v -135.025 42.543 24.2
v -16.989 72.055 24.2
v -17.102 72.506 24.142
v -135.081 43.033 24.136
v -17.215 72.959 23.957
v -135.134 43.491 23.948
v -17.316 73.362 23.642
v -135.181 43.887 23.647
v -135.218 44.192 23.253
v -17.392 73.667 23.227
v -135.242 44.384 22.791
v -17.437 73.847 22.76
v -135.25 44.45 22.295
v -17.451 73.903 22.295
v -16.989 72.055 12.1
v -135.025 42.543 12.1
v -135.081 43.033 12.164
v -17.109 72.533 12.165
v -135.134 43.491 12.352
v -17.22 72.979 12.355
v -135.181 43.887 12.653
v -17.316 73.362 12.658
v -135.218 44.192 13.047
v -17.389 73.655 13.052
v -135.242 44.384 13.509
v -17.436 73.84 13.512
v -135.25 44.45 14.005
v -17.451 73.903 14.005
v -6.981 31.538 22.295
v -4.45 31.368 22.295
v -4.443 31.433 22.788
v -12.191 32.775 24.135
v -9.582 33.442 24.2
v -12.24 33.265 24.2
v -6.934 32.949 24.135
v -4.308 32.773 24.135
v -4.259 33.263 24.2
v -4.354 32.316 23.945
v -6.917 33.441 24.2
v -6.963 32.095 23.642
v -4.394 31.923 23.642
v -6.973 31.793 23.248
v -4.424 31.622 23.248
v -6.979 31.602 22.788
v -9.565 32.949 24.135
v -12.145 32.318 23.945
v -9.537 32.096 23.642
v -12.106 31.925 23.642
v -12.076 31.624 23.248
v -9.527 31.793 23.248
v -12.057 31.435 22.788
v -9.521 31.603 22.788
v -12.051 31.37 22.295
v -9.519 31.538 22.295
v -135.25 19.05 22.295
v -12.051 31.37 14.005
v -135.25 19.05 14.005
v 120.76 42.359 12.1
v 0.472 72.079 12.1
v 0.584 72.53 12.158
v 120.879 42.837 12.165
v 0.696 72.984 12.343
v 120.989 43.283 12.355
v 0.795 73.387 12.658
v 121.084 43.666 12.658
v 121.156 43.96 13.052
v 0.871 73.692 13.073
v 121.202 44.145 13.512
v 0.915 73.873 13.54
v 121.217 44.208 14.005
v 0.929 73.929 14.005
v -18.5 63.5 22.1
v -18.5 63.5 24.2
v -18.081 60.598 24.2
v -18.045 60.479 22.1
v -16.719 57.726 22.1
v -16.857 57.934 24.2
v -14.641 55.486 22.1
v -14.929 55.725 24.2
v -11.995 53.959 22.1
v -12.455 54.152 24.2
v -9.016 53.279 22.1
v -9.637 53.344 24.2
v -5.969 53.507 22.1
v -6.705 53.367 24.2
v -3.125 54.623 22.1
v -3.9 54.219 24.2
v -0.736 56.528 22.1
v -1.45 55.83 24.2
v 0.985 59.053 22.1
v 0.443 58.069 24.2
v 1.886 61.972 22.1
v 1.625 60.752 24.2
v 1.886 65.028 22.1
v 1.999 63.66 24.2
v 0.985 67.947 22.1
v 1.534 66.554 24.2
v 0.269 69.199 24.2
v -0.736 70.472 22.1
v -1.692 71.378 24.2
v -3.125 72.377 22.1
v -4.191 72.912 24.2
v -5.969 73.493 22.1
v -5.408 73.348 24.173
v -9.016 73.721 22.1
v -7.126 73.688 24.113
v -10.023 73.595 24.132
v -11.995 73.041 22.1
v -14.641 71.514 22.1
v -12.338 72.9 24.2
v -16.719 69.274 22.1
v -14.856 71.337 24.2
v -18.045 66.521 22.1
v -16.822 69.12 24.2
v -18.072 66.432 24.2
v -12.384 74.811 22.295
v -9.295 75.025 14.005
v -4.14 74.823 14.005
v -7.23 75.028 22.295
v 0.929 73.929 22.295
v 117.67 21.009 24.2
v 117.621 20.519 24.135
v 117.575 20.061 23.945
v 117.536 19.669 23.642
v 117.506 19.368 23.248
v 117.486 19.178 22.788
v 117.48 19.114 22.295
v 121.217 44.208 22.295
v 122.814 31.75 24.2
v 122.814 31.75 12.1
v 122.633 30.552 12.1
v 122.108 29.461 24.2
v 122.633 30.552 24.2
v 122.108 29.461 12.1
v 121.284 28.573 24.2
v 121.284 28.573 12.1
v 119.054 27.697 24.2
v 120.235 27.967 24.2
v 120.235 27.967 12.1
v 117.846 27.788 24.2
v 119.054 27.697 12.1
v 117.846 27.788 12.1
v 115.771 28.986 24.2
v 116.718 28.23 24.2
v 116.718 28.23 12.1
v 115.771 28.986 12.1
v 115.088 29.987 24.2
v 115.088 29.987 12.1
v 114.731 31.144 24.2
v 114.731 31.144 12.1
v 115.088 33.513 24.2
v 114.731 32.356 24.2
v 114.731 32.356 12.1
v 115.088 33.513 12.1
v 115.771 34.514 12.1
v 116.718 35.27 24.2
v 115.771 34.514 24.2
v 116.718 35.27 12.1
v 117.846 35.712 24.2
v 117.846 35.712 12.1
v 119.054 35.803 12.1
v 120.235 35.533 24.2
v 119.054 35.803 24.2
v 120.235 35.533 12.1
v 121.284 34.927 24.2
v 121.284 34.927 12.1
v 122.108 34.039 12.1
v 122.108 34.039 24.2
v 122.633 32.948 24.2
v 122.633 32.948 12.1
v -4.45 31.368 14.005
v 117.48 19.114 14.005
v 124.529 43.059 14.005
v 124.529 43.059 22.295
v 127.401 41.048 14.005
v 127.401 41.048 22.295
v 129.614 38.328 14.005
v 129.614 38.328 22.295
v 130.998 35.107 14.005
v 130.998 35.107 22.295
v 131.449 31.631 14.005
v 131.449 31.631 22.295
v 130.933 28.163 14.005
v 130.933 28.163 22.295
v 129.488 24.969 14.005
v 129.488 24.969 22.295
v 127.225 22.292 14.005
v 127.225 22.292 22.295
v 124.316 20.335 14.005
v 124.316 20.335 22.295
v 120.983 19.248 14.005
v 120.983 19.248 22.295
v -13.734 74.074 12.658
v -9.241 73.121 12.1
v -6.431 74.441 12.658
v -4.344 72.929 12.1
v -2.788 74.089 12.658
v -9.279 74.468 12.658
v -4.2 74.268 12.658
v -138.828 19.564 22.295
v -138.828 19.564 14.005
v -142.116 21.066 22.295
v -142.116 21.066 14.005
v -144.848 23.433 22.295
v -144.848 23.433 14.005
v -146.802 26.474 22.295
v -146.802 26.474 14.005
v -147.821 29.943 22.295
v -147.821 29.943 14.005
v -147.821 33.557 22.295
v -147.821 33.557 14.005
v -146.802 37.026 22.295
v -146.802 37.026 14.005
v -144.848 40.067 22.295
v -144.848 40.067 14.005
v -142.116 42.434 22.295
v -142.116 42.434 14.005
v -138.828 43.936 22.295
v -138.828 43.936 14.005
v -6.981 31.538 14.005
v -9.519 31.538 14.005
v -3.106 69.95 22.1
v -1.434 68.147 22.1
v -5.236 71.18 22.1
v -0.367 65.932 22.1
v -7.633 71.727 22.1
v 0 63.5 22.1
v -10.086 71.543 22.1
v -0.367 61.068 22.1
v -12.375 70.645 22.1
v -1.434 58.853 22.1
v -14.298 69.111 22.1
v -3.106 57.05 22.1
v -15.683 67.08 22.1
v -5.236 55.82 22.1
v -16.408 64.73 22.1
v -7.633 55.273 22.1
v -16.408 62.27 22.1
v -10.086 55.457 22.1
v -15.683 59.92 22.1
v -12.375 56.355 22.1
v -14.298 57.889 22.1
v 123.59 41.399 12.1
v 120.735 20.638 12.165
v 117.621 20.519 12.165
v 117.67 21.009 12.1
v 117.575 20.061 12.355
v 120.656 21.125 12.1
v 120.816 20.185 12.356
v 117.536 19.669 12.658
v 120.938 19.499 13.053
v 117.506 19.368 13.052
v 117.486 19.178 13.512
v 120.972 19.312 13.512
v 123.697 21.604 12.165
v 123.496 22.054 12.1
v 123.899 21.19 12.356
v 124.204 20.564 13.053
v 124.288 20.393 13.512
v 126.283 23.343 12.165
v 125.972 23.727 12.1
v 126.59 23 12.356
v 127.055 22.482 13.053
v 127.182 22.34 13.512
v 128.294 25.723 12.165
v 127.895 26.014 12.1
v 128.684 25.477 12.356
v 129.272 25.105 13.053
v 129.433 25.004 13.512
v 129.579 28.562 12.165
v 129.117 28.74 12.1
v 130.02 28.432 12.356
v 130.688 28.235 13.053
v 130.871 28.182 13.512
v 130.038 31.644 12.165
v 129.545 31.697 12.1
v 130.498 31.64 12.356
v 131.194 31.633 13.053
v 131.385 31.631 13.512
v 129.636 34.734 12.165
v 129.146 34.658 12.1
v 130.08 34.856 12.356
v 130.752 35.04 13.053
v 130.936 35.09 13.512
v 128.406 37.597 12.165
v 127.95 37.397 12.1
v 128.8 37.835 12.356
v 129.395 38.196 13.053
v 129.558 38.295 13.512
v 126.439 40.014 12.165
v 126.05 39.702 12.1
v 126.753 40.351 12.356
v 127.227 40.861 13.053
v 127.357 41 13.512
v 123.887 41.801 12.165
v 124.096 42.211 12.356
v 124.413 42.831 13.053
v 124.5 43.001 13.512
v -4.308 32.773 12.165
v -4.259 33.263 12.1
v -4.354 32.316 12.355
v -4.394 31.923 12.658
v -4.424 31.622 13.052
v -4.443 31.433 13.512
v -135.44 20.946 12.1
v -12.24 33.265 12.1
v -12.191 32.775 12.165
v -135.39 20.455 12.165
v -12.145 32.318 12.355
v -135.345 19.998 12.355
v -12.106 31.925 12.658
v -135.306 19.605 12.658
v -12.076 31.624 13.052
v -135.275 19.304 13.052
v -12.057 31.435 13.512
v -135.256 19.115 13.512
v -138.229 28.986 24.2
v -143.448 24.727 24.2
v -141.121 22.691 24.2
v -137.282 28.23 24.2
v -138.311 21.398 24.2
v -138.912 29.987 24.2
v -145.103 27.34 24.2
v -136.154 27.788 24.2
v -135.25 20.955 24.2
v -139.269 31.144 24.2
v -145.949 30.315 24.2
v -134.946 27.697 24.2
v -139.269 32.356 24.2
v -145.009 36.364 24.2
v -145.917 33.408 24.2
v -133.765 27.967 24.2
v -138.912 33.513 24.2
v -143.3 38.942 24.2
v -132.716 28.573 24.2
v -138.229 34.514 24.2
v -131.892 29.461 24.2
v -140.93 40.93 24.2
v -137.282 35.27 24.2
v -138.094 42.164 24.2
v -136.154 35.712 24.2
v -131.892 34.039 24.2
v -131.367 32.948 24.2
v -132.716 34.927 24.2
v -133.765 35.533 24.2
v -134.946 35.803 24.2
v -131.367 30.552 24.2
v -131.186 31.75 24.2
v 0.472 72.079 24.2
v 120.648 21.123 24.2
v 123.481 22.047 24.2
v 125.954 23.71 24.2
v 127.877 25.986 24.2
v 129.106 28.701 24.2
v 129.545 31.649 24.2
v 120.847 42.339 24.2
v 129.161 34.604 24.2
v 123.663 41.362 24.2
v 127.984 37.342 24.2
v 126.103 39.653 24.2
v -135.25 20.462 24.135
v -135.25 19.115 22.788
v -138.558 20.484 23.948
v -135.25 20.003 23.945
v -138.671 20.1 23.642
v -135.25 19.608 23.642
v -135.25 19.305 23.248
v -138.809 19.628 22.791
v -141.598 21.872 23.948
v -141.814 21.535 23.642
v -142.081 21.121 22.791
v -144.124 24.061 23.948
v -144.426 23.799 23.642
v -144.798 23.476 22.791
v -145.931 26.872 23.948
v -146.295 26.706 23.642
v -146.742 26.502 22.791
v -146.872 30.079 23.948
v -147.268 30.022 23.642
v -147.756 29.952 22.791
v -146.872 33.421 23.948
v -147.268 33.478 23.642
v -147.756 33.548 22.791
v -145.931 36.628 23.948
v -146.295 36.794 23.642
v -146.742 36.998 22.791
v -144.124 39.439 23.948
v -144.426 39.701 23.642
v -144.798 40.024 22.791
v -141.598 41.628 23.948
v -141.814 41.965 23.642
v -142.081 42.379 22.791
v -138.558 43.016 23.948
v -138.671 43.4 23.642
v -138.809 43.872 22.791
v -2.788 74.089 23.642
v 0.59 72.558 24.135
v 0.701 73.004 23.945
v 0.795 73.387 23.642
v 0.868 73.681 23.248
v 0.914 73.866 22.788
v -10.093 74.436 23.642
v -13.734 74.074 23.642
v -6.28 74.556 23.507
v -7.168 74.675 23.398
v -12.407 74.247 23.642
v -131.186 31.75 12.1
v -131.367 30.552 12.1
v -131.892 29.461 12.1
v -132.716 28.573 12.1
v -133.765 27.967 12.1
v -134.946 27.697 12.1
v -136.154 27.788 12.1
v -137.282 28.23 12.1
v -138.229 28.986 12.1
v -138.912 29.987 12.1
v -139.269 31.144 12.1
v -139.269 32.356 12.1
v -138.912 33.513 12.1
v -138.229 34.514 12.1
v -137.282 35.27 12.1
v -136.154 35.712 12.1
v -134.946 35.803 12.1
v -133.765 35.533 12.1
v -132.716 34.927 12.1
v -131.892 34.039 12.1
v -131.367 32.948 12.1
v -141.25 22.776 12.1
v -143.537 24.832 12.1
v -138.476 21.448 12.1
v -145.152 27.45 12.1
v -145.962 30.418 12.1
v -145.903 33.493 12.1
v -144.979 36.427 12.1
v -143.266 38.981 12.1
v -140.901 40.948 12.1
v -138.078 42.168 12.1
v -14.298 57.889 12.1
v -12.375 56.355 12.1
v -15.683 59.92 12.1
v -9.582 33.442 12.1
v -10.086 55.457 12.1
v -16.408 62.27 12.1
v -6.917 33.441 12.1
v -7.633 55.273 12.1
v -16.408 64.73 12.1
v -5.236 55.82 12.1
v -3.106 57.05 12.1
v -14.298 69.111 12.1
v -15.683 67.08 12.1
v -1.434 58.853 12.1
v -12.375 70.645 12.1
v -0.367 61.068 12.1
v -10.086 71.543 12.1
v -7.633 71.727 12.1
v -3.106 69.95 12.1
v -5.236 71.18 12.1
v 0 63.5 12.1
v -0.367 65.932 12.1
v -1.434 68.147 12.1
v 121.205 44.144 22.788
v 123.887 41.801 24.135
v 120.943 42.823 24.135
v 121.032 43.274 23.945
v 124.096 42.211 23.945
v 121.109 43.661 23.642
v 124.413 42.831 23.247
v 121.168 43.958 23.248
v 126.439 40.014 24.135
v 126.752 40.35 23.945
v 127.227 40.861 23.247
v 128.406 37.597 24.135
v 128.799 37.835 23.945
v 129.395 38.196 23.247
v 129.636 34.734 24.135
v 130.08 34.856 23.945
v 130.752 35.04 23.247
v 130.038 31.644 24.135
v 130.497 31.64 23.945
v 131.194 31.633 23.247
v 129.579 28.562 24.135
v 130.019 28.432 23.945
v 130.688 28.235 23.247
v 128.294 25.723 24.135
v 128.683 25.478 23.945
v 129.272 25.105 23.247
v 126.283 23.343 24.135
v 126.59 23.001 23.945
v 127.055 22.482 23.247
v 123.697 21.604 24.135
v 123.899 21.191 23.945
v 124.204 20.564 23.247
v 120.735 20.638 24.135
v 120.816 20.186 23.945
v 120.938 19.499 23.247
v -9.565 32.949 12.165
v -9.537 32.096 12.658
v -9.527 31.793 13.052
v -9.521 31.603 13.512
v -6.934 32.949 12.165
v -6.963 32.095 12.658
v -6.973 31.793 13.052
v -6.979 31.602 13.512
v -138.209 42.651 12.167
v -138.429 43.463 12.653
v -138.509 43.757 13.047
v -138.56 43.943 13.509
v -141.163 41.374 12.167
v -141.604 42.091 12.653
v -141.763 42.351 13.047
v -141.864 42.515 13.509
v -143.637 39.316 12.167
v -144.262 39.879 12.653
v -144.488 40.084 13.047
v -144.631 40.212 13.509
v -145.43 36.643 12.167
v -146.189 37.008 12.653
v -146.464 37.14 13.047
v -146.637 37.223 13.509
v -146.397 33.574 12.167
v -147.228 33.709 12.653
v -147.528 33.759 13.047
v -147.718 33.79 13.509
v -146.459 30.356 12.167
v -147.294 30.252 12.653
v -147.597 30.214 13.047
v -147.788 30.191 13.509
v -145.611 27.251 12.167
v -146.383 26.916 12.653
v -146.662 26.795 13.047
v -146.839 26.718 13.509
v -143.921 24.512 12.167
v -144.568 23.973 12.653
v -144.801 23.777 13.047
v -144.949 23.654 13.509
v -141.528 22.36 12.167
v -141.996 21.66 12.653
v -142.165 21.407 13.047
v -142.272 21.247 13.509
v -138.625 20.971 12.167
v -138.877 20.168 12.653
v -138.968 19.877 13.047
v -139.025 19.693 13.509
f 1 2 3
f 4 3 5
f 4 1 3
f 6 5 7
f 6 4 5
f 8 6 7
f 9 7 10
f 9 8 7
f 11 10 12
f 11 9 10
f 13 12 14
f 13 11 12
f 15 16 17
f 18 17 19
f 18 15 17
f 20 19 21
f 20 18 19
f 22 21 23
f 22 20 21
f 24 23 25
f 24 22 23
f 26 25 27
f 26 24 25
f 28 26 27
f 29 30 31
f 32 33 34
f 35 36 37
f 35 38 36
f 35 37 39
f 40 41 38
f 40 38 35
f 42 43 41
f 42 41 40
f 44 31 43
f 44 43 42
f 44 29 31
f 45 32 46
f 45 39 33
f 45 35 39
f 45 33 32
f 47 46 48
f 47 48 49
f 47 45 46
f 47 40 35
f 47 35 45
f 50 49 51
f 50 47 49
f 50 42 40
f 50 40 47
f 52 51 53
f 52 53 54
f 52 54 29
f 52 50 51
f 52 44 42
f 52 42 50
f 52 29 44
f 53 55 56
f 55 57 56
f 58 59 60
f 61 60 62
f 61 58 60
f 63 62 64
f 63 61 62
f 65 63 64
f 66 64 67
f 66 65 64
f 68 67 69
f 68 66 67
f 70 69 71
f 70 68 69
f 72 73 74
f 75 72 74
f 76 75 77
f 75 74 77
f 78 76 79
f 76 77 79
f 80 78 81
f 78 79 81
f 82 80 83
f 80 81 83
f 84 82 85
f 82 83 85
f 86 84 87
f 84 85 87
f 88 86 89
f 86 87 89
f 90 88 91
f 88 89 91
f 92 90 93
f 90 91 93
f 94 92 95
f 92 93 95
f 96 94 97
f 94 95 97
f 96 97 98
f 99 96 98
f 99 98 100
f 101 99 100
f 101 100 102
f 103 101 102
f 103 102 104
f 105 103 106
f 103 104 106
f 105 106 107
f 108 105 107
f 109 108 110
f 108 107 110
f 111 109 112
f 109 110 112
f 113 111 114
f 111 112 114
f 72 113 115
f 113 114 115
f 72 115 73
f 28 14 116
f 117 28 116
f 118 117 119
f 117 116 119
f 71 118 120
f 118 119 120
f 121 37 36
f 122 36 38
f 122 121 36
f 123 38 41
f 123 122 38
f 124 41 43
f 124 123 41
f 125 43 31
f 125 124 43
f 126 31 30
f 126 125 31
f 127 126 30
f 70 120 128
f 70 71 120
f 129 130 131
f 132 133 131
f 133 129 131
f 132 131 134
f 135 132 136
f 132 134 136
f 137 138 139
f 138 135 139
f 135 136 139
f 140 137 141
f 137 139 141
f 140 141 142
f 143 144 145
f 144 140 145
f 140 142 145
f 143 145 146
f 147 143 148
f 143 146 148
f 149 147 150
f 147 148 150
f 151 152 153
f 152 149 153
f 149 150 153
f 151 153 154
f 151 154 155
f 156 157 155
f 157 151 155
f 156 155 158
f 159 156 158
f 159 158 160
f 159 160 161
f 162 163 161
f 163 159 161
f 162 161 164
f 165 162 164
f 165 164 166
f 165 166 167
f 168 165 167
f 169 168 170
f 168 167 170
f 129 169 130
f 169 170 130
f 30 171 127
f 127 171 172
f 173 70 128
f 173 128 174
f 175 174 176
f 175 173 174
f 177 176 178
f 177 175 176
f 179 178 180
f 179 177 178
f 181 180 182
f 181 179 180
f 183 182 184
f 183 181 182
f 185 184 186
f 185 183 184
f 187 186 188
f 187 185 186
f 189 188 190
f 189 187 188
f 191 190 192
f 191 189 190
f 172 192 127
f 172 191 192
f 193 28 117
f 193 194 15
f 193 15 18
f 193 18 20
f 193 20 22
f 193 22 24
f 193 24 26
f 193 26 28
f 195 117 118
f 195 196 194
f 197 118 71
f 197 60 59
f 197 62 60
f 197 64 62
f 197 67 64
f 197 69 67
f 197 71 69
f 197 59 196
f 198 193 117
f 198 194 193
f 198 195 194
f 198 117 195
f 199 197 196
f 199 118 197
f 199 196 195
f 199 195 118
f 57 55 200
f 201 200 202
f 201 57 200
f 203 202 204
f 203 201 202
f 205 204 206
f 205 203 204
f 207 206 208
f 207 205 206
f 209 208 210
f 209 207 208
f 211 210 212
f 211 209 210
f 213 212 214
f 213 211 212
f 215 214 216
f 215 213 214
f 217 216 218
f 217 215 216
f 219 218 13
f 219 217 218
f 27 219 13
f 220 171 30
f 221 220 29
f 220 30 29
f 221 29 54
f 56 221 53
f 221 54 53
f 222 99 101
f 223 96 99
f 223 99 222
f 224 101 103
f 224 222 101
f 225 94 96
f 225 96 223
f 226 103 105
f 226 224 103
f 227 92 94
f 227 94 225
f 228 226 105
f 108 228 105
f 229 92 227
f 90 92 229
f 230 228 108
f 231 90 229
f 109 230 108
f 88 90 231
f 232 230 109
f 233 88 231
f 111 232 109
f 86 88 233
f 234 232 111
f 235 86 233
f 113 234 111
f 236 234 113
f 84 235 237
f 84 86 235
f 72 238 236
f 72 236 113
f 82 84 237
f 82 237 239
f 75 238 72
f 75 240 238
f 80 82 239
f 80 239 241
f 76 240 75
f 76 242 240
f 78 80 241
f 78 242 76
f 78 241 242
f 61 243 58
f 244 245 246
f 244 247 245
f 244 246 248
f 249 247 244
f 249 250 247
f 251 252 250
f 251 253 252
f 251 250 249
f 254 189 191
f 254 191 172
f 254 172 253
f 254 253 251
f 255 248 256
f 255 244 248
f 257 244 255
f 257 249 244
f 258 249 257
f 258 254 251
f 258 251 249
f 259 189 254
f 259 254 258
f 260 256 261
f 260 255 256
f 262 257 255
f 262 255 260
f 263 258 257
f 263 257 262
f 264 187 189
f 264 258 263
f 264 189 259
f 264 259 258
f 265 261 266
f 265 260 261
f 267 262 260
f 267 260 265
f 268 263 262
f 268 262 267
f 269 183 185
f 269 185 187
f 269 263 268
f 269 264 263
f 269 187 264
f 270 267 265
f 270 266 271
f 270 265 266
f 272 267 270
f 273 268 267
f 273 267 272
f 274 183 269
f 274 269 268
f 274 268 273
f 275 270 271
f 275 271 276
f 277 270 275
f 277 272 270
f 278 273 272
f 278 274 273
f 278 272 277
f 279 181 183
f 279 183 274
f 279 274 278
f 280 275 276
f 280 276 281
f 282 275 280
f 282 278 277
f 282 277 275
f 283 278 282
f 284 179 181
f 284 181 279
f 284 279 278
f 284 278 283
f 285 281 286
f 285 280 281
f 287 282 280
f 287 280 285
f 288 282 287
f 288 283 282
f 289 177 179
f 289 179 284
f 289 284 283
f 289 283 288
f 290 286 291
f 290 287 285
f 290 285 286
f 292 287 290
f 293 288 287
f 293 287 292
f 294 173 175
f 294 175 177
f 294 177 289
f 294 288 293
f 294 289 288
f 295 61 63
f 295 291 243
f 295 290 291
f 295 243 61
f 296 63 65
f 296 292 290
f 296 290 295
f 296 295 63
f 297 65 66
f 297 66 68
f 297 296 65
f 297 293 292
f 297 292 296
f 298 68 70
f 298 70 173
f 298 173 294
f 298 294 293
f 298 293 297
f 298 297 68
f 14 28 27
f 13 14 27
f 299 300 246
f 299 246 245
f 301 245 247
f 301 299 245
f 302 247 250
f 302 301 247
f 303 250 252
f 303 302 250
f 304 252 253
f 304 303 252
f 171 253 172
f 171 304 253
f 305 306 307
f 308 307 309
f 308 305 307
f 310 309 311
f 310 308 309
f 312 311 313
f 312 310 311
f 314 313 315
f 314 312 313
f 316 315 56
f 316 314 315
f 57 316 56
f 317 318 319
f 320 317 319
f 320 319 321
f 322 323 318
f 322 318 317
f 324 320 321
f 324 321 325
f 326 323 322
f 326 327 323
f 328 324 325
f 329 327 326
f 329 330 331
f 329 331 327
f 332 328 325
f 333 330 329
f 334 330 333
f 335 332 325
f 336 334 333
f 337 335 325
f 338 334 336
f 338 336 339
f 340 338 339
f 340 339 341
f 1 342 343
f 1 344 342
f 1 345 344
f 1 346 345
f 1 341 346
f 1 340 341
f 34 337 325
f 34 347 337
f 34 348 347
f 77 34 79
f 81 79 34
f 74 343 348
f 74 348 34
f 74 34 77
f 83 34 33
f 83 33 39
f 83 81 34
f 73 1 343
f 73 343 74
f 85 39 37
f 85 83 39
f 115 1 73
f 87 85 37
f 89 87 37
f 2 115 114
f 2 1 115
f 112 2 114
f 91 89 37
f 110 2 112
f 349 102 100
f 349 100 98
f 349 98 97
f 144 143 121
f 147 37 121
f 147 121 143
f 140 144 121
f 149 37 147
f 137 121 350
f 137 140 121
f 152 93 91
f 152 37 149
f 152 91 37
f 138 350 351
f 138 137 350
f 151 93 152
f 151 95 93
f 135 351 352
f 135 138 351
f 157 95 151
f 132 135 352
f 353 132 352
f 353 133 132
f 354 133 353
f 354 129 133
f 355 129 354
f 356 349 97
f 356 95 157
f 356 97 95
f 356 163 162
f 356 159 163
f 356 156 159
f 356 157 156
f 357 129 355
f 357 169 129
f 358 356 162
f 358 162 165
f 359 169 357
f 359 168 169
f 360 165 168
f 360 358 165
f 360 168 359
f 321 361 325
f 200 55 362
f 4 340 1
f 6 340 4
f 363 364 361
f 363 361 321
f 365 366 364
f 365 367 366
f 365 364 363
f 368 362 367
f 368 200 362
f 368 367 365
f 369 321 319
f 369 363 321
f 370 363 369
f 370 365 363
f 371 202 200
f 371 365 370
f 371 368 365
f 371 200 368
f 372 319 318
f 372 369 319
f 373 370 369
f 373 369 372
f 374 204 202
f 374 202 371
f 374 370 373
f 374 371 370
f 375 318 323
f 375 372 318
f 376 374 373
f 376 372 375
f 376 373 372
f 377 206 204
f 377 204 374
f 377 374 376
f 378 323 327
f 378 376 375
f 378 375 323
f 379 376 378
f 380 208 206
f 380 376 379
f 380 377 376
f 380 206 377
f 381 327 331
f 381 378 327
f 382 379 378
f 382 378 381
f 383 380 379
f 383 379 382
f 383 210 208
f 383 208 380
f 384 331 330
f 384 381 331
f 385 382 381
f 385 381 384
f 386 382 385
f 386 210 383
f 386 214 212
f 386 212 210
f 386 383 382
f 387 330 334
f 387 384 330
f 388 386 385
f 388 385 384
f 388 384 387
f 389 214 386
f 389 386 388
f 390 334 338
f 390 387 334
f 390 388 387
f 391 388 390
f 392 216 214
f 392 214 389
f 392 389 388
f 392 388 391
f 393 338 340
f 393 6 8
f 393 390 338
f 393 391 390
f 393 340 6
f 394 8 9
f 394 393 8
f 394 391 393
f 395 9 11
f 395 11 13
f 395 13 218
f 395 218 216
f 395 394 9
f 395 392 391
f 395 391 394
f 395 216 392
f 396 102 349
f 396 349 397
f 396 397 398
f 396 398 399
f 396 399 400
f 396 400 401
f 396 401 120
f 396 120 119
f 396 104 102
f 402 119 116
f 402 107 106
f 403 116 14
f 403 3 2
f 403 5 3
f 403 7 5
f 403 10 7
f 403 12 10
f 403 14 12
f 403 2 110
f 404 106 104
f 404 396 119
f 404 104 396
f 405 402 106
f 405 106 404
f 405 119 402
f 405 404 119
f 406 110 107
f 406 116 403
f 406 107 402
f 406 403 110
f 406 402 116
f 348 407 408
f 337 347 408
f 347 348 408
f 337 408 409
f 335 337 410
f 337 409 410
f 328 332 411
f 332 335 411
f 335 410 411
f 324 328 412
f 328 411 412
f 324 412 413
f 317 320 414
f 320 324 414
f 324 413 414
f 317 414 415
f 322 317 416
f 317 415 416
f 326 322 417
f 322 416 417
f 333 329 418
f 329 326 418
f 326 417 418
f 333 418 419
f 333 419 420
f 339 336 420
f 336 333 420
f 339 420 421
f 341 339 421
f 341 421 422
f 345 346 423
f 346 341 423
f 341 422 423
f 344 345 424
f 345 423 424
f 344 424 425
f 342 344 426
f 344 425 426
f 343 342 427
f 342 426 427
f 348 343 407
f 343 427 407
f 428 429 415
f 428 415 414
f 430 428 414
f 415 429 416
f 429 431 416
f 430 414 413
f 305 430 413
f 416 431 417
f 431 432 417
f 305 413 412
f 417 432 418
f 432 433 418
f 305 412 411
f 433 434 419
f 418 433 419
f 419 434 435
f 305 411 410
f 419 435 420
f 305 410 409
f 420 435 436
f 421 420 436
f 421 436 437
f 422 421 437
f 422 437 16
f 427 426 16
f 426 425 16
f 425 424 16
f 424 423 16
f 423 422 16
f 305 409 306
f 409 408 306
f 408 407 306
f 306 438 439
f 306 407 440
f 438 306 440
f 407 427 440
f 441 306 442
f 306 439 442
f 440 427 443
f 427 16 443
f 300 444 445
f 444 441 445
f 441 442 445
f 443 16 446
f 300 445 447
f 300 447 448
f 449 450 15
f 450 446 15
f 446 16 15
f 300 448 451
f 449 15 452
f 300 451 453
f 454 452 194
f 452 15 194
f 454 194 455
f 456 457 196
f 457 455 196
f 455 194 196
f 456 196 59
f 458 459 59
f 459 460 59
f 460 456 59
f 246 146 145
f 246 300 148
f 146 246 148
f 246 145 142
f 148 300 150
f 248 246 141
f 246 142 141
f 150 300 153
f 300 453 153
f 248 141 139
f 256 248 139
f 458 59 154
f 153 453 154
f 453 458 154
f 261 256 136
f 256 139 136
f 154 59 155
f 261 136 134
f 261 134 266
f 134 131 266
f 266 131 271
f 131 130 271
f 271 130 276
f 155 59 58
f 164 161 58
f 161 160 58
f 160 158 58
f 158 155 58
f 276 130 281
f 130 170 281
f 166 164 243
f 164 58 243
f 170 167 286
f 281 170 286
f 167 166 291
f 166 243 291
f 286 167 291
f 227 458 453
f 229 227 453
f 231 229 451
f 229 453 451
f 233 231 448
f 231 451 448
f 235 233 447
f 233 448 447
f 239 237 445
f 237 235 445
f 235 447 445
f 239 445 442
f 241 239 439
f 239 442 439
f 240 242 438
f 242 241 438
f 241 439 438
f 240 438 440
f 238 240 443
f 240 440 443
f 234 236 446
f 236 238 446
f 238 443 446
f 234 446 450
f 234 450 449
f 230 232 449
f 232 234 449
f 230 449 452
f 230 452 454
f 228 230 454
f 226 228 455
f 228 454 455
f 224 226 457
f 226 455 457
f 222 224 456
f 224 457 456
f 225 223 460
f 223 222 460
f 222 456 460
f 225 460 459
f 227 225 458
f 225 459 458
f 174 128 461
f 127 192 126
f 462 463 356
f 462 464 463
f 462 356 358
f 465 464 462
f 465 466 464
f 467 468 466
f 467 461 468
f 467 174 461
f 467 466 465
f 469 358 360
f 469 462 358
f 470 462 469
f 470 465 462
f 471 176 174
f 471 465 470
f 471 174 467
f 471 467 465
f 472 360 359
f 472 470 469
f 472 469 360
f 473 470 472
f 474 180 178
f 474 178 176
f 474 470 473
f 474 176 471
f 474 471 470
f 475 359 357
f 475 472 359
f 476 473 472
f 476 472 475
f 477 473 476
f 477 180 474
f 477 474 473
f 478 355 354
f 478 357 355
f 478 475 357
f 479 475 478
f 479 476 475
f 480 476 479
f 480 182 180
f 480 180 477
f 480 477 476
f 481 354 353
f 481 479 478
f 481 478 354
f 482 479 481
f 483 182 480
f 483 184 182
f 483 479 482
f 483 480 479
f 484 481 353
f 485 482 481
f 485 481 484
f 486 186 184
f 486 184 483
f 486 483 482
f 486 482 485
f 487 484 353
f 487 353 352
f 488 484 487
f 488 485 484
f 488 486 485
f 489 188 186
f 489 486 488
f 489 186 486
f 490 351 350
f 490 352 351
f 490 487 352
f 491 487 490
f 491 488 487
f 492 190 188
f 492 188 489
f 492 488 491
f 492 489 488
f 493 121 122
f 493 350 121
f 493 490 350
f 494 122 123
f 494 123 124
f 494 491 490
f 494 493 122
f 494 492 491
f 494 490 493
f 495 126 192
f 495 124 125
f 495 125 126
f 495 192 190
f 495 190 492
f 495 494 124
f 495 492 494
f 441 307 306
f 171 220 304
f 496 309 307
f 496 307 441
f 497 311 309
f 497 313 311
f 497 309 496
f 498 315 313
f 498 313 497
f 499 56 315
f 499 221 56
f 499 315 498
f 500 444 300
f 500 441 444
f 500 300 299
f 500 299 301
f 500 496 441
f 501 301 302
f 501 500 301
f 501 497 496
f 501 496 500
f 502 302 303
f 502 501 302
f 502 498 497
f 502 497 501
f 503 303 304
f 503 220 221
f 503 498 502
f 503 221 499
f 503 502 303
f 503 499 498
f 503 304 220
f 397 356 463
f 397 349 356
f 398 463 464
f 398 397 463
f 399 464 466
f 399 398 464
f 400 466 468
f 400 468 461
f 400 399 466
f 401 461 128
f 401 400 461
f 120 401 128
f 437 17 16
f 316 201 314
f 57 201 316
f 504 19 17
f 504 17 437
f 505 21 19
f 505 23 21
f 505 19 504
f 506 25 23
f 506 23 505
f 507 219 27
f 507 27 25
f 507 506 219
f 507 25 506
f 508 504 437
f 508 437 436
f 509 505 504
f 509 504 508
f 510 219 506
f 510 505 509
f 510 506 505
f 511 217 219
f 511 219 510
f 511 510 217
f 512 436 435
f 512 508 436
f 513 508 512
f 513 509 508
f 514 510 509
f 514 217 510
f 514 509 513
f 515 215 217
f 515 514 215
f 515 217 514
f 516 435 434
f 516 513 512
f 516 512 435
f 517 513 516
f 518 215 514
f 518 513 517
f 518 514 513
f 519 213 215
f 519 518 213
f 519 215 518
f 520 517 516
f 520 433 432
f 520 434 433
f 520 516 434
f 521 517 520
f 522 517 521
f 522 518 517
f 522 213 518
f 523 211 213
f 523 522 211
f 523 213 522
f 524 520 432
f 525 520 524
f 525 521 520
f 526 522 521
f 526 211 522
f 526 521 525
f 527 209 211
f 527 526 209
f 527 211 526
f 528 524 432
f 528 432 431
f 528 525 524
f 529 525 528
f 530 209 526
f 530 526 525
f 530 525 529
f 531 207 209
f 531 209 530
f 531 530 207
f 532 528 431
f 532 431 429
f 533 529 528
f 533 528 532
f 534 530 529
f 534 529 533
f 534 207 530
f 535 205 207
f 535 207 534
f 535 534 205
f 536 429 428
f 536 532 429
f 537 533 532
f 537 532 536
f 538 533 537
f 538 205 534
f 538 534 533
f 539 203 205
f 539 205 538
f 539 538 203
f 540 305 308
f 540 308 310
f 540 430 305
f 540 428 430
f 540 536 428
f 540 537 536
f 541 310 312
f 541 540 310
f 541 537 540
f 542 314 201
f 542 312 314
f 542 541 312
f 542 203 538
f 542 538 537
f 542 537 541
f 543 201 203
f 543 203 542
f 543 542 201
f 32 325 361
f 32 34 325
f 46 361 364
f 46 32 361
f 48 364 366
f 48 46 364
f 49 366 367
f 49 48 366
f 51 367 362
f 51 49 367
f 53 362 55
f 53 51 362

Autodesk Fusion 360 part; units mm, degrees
sketch "Sketch1" plane through (0, 0, 0) normal (0, 0, 1) x (1, 0, 0)
  line L0 (0, 0) -> (254, 0) construction
  line L1 (0, 0) -> (-254, 0) construction
  circle A0 centre (-254, 0) radius 8.128
  circle A1 centre (254, 0) radius 8.128
  line L2 (0, 0) -> (0, 63.5) construction
  circle A2 centre (0, 63.5) radius 16.5
  line L3 (-254, -25.4) -> (0, 0)
  line L4 (0, 0) -> (251.46, -25.2727)
  arc A3 (-254, 25.4) -> (-248.9703, -24.897) centre (-254, 0) ccw
  arc A4 (251.46, -25.2727) -> (258.9348, 24.916) centre (254, 0) ccw
  line L5 (-0.0285, 88.9) -> (-254, 25.4)
  line L6 (-0.0285, 88.9) -> (258.9348, 24.916)
  arc A5 (11.8546, 85.9639) -> (-11.9289, 85.9245) centre (0, 63.5) ccw
  dimension "d1" = 254
  dimension "d2" = 254
  dimension "d3" = 16.256
  dimension "d4" = 16.256
  dimension "d5" = 33
extrude "Extrude1" add sketch "Sketch1" along normal blind 24.2 contours L3 L4 A3 A4 L5 L6
fillet "Fillet1" radius 76.2 2 edges at (0, 0, 12.1) (-0.0285, 88.9, 12.1)
fillet "Fillet2" radius 3.81 16 edges at (-130.8006, -13.0801, 24.2) (-0.0001, -0.382, 24.2) (129.5305, -13.0183, 24.2) (279.1229, -3.7416, 24.2) (-279.4, 0, 24.2) (-130.8006, -13.0801, 0) (-0.0001, -0.382, 0) (129.5305, -13.0183, 0) (279.1229, -3.7416, 0) (-279.4, 0, 0) (138.6465, 54.6365, 24.2) (-0.0253, 86.5815, 24.2) (-136.2013, 54.853, 24.2) (-136.2013, 54.853, 0) (-0.0253, 86.5815, 0) (138.6465, 54.6365, 0)
scale "Scale1" factor 0.5 about (-16.5, 63.5, 24.2) bodies 1
sketch "Sketch2" plane through (0, 0, 24.2) normal (0, 0, 1) x (-1, 0, 0)
  circle A0 centre (8.25, -63.5) radius 8.25
  circle A1 centre (-118.75, -31.75) radius 4.064
  circle A2 centre (135.25, -31.75) radius 4.064
  line L0 (135.3412, -20.9554) -> (12.2402, -33.2655)
  arc A3 (4.259, -33.2635) -> (12.2402, -33.2655) centre (8.2595, 6.541) ccw
  line L1 (4.259, -33.2635) -> (-117.6705, -21.0091)
  arc A4 (-117.6705, -21.0091) -> (-120.8054, -42.3475) centre (-118.75, -31.75) ccw
  line L2 (-120.8054, -42.3475) -> (-0.4722, -72.0791)
  arc A5 (-0.4722, -72.0791) -> (16.9892, -72.0549) centre (8.2097, -36.9408) ccw
  line L3 (16.9892, -72.0549) -> (135.0248, -42.5427)
  arc A6 (135.0248, -42.5427) -> (135.3412, -20.9554) centre (135.25, -31.75) ccw
  circle A7 centre (8.25, -63.5) radius 10.25
  dimension "d13" = 20.5
extrude "Extrude2" cut sketch "Sketch2" against normal blind 2.1 contours A5 A7 | A5 A7
